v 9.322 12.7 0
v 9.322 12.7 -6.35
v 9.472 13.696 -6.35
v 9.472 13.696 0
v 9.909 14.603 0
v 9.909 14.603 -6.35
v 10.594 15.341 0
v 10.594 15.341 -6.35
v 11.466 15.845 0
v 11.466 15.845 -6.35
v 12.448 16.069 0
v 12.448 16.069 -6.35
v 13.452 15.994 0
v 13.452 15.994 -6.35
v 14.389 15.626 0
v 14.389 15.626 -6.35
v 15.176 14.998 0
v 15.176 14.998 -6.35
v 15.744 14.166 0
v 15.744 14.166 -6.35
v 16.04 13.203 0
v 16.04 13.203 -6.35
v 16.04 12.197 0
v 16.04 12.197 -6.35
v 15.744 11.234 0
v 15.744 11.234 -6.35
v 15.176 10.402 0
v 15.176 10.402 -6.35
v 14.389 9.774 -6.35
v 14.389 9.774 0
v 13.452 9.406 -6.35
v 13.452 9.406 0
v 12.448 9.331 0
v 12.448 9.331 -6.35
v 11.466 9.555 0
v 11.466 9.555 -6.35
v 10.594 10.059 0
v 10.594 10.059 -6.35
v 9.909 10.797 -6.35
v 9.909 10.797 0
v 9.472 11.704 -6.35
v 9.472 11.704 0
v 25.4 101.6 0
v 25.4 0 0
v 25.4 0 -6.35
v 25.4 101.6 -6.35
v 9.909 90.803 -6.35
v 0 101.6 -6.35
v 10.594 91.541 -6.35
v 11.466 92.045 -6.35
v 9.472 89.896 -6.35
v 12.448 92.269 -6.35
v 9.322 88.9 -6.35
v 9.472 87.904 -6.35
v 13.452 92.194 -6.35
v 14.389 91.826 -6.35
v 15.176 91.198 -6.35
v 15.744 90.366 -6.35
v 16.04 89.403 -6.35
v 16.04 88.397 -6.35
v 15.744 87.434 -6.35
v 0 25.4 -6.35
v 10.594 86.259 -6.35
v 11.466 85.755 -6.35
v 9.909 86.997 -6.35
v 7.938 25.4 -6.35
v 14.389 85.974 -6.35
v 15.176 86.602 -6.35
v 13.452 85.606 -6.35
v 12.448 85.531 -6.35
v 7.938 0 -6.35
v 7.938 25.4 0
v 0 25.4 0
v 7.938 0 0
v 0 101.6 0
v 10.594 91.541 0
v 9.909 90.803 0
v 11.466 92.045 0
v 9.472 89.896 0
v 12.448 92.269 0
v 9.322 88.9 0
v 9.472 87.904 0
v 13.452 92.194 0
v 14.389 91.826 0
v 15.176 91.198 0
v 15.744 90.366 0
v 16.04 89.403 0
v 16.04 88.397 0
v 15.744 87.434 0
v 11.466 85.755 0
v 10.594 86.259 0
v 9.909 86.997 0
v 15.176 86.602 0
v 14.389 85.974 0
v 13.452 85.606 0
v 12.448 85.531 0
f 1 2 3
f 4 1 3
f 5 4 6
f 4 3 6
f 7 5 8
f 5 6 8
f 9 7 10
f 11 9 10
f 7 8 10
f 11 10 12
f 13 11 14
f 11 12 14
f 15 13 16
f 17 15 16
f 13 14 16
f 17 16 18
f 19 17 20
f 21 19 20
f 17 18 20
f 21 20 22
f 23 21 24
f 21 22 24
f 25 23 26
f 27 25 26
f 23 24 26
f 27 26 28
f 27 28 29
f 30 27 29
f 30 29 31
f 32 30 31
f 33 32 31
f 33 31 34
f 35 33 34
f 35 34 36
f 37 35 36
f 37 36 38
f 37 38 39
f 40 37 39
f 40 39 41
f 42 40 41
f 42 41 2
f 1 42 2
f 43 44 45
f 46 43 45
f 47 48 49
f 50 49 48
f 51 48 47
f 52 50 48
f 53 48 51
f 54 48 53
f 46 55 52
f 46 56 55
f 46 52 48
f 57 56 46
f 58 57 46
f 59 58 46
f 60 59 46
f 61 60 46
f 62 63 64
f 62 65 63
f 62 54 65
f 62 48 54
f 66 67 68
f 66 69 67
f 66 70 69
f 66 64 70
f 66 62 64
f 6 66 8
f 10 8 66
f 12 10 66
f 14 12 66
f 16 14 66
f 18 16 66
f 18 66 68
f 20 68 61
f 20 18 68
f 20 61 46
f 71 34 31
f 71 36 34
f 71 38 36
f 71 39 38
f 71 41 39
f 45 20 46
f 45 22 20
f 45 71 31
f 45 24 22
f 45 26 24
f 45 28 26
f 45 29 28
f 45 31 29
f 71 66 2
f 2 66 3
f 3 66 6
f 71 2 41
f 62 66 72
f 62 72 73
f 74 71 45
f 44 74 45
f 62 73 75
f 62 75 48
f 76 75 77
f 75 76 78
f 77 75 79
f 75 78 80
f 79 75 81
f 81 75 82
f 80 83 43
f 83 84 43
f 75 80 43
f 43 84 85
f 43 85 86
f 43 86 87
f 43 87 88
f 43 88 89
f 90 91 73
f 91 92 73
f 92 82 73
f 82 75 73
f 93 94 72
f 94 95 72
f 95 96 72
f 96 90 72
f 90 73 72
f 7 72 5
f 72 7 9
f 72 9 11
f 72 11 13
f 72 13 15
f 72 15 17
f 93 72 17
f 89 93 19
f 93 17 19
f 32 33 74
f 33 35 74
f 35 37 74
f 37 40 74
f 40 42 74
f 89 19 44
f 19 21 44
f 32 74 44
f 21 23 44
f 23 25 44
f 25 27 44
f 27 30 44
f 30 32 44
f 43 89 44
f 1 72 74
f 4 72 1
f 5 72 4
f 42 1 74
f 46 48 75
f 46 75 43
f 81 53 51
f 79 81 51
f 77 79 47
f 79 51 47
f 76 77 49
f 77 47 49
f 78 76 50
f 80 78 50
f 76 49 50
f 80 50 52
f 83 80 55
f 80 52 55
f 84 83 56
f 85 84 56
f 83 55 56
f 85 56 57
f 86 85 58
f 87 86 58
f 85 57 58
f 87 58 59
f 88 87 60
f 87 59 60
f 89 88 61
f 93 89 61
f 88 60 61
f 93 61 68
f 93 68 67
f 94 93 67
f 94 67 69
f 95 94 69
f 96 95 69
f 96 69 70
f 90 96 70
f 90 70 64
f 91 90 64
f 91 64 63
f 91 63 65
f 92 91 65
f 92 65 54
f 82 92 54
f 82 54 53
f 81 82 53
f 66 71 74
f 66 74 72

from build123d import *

# Parameters (mm, degrees)
SKETCH1_W                    = 25.4
SKETCH1_H                    = 6.35
BOSS_EXTRUDE1_DEPTH          = 101.6
H_0_266_DIAMETER_HOLE1_D     = 6.7564
H_0_266_DIAMETER_HOLE1_DEPTH = 6.35
SKETCH4_W                    = 7.9375
SKETCH4_H                    = 25.4
CUT_EXTRUDE1_DEPTH           = 7.35


with BuildPart() as part:
    # Sketch1 → Boss-Extrude1 (new body)
    with BuildSketch(Plane(origin=(0, 0, 0), x_dir=(1, 0, 0), z_dir=(0, 1, 0))):
        with Locations((12.7, 3.175)):
            Rectangle(SKETCH1_W, SKETCH1_H)
    extrude(amount=BOSS_EXTRUDE1_DEPTH)

    # H (0.266) Diameter Hole1
    with Locations(Plane.XY):
        with Locations((12.7, 88.9), (12.7, 12.7)):
            Hole(H_0_266_DIAMETER_HOLE1_D / 2, depth=H_0_266_DIAMETER_HOLE1_DEPTH)

    # Sketch4 → Cut-Extrude1 (cut, through all)
    with BuildSketch(Plane(origin=(0, 0, -6.35), x_dir=(-1, 0, 0), z_dir=(0, 0, -1))):
        with Locations((-3.96875, 12.7)):
            Rectangle(SKETCH4_W, SKETCH4_H)
    extrude(amount=-CUT_EXTRUDE1_DEPTH, mode=Mode.SUBTRACT)


solid = part.part
